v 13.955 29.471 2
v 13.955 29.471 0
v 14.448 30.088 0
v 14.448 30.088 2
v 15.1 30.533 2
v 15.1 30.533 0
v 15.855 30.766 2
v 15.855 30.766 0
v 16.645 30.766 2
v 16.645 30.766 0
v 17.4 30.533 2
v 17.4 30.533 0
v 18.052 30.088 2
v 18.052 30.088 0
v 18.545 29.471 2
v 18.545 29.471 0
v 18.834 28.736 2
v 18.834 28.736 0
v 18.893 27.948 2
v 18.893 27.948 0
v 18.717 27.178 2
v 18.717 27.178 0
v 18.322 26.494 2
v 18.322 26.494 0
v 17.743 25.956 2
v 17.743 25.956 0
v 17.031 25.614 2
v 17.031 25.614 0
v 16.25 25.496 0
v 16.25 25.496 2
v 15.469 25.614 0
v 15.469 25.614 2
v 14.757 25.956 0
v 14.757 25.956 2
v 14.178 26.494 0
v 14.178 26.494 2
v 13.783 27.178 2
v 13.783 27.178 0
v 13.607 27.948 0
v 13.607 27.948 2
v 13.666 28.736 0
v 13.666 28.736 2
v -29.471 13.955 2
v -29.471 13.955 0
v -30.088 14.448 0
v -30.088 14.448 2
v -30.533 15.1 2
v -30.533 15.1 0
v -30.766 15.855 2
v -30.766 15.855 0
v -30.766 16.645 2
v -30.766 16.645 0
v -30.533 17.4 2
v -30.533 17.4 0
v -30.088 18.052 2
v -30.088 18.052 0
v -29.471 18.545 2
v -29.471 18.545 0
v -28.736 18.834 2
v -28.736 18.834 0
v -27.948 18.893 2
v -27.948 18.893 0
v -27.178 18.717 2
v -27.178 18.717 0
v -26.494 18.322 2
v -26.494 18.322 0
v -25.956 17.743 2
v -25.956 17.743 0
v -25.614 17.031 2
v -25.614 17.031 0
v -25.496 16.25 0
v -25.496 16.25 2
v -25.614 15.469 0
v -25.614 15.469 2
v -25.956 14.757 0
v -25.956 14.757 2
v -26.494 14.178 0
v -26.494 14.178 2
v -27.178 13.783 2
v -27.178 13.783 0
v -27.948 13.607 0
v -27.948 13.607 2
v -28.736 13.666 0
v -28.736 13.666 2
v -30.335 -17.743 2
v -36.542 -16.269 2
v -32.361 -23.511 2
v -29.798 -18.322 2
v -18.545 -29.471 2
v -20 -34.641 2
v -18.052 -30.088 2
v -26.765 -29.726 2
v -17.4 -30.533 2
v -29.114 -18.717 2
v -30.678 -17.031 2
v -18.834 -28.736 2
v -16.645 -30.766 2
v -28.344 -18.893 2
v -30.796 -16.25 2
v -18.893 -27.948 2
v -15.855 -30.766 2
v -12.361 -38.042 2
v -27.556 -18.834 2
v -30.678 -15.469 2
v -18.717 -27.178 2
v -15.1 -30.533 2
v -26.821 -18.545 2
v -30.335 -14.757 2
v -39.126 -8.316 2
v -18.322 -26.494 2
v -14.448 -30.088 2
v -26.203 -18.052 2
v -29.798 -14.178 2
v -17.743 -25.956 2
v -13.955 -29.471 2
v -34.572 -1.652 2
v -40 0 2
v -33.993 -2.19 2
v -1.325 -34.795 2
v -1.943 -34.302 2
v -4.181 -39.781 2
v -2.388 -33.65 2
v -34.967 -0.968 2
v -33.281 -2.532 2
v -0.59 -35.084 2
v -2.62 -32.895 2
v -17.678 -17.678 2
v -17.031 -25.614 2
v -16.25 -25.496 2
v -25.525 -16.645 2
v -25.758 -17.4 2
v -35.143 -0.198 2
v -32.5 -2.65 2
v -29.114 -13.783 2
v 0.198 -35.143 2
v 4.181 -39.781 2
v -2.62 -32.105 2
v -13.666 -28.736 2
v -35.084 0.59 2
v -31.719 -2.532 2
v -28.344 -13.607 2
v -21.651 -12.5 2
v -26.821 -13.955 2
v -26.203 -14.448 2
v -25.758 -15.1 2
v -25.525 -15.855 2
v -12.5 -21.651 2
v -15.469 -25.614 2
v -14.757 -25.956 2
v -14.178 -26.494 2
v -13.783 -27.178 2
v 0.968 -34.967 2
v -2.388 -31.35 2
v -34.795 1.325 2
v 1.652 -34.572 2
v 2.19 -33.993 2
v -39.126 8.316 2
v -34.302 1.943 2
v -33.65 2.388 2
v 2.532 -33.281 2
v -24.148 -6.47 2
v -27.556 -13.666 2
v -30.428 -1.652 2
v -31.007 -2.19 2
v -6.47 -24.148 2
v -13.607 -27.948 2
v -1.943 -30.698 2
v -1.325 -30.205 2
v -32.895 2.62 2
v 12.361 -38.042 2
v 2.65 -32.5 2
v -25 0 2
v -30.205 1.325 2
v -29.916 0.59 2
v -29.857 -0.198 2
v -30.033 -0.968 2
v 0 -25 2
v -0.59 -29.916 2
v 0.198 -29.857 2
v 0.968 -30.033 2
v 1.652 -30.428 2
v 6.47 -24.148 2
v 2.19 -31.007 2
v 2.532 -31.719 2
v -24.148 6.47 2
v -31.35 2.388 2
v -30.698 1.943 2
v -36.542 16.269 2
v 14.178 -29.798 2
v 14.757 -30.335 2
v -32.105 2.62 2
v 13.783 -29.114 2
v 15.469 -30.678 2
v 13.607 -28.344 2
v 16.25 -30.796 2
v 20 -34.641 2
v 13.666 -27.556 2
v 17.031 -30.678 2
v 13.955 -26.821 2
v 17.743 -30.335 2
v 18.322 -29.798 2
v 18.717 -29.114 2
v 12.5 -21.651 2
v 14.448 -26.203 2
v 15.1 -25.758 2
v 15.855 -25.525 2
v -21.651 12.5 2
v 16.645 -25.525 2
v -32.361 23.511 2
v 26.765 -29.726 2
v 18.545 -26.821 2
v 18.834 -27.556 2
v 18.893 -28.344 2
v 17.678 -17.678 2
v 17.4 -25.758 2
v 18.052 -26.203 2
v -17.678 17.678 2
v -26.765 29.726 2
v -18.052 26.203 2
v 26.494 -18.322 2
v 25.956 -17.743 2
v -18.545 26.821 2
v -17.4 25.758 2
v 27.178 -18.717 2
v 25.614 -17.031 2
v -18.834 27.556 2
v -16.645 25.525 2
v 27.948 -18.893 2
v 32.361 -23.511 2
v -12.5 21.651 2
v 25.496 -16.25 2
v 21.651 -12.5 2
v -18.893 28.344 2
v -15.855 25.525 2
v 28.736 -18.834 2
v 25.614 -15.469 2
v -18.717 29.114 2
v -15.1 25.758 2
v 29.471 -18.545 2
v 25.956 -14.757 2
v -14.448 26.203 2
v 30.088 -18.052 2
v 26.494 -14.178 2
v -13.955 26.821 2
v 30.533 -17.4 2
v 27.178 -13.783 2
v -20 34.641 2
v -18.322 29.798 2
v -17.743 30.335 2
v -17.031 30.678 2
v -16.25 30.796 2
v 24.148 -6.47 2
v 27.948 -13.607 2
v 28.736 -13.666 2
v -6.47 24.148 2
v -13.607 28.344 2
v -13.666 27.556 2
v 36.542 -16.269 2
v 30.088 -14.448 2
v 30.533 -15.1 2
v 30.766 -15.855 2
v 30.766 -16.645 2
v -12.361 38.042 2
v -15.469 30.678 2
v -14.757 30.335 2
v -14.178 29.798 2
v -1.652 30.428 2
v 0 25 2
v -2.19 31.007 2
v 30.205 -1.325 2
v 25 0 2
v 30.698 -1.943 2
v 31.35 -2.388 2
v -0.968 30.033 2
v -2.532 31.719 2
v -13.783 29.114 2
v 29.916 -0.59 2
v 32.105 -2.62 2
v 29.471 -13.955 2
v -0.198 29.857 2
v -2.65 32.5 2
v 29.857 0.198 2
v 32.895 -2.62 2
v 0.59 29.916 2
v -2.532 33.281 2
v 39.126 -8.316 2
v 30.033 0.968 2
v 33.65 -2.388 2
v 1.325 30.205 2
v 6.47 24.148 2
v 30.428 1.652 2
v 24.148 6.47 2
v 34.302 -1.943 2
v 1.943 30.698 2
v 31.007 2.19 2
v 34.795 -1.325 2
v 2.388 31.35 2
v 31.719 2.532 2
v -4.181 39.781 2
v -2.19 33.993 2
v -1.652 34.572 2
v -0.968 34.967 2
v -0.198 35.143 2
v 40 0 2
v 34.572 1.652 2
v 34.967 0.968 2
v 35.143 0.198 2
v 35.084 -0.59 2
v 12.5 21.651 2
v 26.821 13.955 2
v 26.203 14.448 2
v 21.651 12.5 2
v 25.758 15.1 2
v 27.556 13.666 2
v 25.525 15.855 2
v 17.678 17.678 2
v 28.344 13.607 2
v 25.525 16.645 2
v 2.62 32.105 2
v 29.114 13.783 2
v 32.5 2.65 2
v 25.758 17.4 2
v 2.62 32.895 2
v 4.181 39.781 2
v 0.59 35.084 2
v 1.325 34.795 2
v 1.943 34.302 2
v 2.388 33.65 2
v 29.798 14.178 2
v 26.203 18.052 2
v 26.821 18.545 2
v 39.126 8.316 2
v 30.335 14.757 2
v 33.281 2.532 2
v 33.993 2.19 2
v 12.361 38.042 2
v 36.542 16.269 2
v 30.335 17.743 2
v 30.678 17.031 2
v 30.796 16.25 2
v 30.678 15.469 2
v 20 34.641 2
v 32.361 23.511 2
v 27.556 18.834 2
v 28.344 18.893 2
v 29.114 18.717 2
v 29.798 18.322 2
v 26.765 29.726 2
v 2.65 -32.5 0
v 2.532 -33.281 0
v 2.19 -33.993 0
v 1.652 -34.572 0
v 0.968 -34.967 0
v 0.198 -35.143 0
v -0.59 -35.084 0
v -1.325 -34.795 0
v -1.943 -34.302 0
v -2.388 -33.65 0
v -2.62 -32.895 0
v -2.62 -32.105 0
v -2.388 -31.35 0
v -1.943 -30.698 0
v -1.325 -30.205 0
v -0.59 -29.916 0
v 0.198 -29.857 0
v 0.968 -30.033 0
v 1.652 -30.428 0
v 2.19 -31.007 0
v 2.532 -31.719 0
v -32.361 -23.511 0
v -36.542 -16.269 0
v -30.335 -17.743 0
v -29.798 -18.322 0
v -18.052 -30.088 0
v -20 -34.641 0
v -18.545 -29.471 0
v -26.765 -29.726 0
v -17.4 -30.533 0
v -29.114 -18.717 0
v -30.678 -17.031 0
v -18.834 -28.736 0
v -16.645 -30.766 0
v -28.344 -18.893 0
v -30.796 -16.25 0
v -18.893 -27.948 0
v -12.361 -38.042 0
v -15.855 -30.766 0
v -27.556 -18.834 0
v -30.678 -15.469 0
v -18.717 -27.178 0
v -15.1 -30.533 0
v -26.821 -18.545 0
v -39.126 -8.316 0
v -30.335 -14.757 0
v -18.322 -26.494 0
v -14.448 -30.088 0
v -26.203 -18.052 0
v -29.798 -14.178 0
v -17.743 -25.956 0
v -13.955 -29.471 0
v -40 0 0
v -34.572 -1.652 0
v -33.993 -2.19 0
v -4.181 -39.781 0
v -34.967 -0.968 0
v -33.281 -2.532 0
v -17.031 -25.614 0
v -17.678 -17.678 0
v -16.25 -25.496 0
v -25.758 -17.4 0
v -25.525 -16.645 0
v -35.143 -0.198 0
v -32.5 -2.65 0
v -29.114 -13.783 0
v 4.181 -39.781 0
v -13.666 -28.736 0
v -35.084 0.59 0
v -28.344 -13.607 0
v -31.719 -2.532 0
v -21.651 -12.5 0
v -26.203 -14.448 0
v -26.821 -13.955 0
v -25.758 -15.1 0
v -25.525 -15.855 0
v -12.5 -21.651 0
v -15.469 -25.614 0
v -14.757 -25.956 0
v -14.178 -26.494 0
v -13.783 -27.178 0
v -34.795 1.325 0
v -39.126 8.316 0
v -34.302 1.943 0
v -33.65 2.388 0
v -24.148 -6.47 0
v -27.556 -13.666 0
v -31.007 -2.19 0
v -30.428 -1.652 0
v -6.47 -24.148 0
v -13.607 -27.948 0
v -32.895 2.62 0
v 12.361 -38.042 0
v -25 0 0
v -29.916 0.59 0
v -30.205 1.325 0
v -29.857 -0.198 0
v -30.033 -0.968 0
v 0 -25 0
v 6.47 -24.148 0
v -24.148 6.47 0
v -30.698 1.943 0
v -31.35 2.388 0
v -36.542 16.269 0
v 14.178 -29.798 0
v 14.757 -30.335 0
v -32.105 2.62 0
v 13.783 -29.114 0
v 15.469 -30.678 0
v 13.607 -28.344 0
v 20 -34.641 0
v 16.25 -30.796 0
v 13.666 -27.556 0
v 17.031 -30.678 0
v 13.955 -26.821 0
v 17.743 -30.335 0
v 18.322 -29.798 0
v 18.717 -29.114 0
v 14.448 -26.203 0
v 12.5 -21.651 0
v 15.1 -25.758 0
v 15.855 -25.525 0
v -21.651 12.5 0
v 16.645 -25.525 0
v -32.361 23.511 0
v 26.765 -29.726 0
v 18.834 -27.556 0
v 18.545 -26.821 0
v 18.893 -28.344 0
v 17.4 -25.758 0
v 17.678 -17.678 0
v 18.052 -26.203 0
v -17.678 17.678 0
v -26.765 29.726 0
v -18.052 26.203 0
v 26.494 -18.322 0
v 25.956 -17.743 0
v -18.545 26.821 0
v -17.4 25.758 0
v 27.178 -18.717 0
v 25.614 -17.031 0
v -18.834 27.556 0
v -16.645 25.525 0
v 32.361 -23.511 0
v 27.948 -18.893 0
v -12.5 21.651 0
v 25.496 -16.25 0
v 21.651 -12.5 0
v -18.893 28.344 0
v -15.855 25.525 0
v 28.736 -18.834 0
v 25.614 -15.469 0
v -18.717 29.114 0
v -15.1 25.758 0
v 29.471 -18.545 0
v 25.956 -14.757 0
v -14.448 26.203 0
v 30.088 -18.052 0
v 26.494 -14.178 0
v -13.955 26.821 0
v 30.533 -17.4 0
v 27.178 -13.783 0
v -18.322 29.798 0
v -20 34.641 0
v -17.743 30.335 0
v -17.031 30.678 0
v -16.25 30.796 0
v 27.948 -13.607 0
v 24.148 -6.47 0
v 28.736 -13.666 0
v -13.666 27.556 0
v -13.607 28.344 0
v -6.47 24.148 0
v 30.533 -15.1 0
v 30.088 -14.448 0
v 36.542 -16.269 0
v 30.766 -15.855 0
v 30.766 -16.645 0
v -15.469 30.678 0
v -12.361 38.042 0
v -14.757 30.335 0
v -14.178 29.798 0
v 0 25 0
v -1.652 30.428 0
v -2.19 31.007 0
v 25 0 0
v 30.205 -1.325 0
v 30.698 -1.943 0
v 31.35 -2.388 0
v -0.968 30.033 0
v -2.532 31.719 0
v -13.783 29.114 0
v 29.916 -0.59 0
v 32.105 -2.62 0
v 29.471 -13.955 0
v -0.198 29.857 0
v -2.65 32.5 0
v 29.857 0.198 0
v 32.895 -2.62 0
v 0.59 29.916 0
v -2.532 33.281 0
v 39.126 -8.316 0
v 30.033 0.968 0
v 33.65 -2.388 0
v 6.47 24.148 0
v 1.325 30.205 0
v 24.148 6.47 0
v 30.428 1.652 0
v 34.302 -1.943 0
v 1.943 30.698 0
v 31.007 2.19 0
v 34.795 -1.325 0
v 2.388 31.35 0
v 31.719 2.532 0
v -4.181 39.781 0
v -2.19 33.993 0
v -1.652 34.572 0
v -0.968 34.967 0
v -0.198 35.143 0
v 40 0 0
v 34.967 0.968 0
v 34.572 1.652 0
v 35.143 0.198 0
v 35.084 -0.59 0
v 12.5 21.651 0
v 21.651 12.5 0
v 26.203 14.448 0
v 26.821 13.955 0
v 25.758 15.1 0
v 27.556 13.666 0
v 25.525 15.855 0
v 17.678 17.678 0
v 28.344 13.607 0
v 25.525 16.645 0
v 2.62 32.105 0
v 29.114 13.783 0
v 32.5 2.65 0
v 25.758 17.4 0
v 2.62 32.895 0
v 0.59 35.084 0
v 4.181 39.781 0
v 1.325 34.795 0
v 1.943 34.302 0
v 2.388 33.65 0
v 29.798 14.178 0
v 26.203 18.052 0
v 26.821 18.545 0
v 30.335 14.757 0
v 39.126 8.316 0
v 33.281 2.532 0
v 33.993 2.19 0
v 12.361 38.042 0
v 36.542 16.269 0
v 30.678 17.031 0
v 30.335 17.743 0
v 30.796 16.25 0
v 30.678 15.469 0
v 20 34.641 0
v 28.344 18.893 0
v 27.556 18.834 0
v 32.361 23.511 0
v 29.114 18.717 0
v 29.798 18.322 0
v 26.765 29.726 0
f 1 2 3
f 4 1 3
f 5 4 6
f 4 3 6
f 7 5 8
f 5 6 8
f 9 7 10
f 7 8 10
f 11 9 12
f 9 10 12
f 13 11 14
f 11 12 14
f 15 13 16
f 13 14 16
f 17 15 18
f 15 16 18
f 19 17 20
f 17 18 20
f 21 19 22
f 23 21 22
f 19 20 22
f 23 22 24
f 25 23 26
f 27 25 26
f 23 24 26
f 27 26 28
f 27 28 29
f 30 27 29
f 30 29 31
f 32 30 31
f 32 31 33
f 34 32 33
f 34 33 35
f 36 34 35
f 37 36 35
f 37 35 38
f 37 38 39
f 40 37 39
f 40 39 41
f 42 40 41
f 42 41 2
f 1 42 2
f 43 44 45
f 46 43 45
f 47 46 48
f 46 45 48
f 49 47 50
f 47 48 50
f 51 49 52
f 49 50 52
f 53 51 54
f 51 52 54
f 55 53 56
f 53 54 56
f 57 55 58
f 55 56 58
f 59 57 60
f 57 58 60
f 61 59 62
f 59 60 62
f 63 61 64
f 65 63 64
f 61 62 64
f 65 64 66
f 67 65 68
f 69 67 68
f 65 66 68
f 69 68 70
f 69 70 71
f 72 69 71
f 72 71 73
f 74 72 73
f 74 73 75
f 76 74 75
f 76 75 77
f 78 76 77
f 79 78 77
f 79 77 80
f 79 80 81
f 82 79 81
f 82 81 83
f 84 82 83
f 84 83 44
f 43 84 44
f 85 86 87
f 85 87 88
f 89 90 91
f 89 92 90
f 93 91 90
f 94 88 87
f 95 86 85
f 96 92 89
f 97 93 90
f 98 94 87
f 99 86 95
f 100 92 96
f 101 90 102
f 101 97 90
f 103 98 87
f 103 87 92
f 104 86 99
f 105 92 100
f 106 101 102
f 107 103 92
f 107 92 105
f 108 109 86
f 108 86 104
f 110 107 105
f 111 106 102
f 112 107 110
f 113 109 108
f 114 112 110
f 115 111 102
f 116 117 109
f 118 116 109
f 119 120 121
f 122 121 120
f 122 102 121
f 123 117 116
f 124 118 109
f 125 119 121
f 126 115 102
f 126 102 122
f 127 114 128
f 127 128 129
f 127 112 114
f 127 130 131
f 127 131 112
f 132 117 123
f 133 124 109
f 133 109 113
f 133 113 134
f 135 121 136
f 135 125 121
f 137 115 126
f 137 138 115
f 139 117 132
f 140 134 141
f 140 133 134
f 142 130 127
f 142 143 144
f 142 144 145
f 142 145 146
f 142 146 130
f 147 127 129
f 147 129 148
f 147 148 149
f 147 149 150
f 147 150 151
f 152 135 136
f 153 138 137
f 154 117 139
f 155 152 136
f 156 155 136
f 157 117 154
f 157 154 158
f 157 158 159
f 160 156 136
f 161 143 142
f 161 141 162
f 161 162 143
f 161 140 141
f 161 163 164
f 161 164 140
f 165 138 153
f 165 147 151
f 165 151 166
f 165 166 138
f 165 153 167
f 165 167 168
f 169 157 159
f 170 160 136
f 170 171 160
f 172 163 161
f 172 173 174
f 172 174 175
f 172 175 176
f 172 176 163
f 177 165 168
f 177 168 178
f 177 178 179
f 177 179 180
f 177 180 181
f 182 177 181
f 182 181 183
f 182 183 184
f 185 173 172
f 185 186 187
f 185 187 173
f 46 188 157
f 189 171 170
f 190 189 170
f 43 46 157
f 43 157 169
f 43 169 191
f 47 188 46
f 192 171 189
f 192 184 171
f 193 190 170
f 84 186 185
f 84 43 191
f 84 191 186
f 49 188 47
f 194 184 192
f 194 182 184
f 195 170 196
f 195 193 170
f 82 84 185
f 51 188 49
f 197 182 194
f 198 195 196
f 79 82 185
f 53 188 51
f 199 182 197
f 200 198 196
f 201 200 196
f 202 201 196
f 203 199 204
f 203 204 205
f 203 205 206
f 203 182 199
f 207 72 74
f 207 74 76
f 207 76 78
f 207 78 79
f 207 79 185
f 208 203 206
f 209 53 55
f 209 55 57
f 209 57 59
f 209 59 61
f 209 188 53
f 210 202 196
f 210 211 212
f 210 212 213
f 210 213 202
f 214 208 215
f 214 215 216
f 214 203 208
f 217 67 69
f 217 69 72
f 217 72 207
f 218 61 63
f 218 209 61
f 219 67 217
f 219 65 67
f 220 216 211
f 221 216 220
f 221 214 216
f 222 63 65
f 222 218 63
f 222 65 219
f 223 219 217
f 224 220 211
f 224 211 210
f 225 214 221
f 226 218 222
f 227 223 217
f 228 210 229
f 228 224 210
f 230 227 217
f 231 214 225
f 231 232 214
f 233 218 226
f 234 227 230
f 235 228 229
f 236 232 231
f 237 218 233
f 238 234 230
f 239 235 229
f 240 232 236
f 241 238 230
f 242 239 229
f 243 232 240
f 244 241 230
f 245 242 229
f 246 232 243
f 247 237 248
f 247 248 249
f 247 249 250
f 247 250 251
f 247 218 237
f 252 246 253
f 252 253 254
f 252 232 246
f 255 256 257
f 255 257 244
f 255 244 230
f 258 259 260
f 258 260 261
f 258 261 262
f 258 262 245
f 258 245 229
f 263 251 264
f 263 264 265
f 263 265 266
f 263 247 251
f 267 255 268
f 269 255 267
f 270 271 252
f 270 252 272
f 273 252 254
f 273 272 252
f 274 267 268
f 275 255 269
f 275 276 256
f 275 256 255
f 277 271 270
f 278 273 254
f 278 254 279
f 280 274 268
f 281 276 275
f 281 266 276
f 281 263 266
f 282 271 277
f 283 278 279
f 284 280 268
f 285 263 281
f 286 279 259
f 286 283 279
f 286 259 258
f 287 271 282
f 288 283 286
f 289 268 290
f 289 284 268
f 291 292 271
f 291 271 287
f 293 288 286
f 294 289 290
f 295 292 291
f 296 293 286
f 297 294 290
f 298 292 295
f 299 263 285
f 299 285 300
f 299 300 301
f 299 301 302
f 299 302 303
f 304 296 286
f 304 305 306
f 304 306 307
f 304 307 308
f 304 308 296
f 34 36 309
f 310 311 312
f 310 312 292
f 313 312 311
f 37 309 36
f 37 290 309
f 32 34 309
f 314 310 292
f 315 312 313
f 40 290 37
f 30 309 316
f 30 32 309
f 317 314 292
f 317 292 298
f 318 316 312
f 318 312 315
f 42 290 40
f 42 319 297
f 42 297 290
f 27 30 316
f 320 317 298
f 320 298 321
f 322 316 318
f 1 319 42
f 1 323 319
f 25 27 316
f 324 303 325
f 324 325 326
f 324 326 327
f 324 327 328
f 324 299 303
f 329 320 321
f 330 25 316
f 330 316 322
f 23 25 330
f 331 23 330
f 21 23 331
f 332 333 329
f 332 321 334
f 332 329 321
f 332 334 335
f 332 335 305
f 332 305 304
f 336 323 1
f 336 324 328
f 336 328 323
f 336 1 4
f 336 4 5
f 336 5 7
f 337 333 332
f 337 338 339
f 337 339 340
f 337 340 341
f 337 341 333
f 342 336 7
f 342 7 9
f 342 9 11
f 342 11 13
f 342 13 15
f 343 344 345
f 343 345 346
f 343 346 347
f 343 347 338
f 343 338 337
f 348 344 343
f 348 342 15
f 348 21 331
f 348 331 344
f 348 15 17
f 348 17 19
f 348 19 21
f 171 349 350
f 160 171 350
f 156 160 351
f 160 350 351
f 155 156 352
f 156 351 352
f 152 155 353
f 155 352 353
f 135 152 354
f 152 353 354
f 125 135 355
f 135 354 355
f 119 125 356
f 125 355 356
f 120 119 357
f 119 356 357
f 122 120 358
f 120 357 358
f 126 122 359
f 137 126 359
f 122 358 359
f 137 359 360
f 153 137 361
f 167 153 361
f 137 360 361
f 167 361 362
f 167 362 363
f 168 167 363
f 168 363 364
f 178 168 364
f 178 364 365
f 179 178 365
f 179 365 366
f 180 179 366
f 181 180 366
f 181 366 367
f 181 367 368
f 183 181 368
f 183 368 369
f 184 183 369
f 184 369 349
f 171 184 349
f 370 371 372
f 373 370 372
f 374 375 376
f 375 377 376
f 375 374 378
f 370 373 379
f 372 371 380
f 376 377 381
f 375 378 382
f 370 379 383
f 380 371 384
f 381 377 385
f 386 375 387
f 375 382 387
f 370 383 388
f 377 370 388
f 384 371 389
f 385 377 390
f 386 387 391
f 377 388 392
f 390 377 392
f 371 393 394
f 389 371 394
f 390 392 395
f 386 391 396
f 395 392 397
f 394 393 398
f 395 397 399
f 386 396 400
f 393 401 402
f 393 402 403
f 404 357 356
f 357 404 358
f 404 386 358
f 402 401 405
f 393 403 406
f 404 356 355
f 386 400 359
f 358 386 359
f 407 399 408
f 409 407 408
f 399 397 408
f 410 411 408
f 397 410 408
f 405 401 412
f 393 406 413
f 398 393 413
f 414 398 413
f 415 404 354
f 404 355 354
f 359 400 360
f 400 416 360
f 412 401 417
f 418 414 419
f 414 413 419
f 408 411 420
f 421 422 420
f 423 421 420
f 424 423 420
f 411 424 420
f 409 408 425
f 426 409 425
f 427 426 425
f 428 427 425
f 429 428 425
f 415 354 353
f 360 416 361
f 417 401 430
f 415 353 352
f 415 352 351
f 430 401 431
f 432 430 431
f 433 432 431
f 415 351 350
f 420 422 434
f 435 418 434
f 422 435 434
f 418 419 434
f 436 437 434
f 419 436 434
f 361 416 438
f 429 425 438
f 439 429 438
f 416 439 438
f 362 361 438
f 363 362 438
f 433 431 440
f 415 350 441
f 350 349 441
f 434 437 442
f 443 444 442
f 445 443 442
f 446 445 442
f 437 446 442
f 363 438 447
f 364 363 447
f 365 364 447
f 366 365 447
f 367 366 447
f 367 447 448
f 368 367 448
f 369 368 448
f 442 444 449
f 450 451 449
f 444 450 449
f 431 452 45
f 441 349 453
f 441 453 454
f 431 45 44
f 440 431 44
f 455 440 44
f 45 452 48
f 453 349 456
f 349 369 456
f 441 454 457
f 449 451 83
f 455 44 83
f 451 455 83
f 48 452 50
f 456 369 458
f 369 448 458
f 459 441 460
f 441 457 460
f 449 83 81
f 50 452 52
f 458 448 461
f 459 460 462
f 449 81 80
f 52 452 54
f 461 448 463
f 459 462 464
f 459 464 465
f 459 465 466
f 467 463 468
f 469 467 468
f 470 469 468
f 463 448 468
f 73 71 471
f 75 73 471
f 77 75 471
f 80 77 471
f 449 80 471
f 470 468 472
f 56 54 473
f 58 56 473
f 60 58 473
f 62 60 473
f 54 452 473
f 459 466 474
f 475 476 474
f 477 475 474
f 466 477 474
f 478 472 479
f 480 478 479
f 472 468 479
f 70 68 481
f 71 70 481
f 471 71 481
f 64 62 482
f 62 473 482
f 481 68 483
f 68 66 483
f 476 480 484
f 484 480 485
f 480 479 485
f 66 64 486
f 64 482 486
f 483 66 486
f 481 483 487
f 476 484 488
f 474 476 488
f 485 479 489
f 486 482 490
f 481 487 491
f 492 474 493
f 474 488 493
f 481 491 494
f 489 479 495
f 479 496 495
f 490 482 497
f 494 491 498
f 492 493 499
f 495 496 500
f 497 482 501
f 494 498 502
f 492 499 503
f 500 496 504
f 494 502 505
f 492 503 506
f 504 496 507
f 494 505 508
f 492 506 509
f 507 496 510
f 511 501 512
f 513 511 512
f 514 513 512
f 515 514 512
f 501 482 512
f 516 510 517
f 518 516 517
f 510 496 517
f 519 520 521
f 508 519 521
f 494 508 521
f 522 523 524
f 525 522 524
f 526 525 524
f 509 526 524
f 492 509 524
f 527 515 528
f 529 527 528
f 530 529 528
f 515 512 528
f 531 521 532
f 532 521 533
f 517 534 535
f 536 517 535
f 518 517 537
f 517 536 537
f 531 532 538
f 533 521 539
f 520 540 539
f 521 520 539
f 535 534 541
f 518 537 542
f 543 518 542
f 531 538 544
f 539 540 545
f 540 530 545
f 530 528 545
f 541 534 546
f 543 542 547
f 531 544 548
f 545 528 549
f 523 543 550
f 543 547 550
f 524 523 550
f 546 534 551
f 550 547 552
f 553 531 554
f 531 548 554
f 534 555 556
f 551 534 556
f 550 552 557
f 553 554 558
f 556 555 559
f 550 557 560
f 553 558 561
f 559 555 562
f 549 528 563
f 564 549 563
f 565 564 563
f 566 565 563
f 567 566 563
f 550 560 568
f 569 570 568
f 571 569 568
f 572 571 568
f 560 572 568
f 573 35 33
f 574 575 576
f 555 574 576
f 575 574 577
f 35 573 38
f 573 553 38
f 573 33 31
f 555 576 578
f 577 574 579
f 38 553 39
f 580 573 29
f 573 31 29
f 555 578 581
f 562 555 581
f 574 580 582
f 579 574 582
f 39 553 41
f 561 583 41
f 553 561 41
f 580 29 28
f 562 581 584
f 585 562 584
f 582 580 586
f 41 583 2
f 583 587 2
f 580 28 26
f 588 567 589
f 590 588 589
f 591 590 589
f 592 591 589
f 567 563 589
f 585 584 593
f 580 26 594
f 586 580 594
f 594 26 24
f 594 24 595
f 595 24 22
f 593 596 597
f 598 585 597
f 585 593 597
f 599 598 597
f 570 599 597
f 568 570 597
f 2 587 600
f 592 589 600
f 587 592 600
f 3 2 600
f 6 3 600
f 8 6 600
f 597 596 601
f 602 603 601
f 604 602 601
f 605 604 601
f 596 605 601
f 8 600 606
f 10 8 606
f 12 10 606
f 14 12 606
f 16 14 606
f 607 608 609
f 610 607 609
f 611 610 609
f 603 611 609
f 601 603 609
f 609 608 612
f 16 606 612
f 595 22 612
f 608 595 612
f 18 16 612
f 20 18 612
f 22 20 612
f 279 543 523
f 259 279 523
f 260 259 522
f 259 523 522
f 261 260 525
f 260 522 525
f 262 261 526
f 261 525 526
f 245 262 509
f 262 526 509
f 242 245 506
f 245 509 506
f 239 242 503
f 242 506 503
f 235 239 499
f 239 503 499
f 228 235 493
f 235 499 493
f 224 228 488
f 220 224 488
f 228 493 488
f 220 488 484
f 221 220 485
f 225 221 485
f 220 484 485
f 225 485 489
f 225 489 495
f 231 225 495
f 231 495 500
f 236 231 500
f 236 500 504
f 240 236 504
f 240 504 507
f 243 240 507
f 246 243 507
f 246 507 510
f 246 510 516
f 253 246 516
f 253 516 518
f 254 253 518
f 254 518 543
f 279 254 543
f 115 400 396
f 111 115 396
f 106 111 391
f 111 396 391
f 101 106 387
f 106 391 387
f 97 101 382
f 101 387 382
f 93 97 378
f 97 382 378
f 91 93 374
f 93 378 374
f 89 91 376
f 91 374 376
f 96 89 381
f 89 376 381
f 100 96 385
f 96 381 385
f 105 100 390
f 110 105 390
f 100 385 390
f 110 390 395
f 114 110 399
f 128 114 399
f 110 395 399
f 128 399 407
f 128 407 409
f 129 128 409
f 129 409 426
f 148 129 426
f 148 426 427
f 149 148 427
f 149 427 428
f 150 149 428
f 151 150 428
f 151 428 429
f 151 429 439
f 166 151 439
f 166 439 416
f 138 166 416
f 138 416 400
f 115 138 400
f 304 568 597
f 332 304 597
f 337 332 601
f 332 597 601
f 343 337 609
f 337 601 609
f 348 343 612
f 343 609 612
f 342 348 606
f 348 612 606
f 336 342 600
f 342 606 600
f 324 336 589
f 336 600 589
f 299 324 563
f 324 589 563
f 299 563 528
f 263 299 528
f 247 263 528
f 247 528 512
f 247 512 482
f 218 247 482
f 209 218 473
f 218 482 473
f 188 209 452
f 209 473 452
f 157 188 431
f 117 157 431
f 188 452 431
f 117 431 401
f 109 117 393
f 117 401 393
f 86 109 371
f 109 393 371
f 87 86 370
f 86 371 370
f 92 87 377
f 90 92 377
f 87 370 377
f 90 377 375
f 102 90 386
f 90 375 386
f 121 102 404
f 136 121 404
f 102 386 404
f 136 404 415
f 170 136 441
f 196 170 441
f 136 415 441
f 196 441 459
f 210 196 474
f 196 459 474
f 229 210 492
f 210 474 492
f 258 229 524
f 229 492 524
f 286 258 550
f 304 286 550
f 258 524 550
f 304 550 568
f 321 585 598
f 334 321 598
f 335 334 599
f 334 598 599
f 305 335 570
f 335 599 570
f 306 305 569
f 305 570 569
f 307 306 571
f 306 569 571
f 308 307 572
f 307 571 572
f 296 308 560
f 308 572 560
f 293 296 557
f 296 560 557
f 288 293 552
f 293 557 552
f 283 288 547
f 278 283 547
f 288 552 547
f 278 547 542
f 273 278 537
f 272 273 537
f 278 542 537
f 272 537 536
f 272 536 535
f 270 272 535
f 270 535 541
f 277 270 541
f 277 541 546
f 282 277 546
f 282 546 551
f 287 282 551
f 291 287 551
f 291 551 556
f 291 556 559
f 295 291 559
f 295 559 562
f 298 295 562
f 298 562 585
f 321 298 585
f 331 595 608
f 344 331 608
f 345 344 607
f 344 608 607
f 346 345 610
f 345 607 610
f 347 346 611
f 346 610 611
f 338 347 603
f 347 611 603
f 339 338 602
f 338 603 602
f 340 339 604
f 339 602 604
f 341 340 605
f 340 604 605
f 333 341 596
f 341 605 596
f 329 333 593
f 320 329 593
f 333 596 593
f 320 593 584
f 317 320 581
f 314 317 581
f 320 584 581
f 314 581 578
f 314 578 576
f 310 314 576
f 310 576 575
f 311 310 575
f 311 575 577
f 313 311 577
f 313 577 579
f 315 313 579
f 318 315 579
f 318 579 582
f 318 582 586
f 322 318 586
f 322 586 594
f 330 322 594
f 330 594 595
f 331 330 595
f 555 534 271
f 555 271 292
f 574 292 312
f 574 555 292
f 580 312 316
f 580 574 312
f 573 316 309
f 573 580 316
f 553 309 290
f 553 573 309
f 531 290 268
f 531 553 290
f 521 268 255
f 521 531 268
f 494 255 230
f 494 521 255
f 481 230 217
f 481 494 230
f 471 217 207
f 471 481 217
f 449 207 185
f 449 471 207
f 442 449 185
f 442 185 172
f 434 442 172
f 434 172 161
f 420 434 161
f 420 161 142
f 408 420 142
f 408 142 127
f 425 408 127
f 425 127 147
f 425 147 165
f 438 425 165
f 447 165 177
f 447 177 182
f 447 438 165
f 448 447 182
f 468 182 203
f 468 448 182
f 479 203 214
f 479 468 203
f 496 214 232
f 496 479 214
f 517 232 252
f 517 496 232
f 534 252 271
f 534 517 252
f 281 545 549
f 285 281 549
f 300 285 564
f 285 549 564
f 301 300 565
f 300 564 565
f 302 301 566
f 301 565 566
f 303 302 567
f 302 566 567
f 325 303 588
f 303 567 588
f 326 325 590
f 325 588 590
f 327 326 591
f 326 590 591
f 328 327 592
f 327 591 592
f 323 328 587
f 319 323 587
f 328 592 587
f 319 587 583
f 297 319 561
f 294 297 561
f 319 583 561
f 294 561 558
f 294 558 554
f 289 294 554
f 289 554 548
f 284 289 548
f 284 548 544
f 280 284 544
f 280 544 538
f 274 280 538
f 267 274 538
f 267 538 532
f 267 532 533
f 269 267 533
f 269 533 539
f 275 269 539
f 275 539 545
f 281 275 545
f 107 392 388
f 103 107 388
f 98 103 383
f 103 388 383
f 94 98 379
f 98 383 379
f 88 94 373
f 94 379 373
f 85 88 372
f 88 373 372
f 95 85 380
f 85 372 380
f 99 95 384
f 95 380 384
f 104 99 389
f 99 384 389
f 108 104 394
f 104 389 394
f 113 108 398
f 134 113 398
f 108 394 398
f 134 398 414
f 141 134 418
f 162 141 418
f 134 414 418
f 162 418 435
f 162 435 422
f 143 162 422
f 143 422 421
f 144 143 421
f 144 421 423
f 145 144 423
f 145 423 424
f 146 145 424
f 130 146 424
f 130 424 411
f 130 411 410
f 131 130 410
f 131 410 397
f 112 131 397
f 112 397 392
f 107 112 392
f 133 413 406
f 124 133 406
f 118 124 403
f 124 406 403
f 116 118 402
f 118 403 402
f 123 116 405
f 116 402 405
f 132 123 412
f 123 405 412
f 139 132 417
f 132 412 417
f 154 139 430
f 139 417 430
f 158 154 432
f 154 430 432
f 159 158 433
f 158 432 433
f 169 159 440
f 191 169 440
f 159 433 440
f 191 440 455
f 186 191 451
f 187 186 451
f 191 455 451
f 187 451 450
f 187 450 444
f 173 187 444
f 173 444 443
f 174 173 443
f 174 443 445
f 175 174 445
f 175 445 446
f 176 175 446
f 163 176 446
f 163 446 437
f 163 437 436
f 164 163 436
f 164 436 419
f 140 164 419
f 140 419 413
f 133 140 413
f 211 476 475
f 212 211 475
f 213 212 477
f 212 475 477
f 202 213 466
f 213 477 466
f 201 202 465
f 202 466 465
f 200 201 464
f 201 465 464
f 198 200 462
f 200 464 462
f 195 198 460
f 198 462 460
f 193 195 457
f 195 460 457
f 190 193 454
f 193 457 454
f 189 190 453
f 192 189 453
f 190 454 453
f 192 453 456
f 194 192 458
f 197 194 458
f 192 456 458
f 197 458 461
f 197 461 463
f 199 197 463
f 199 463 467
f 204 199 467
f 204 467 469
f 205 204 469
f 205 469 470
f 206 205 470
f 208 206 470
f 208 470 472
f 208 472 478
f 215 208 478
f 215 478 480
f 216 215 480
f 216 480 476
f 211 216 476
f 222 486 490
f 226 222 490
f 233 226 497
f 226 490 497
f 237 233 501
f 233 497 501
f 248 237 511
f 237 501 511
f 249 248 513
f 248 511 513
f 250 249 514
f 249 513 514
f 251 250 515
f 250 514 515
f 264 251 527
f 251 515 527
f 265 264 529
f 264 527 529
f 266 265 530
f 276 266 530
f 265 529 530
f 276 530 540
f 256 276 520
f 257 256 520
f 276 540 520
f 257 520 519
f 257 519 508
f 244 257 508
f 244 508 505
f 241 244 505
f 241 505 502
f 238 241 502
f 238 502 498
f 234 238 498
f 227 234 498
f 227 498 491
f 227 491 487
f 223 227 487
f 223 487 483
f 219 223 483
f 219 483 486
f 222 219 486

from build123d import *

# Parameters (mm, degrees)
SKETCH1_R            = 40
SKETCH1_R_2          = 25
BOSS_EXTRUDE1_DEPTH  = 2
M5_CLEARANCE_HOLE1_D = 5.3
CIRPATTERN1_COUNT    = 12


with BuildPart() as part:
    # Sketch1 → Boss-Extrude1 (new body)
    with BuildSketch(Plane.XY):
        Circle(SKETCH1_R)
        Circle(SKETCH1_R_2, mode=Mode.SUBTRACT)
    extrude(amount=BOSS_EXTRUDE1_DEPTH)

    # M5 Clearance Hole1 (through all)
    with Locations(Plane.XY.offset(2)):
        with Locations((0, 32.5)):
            m5_clearance_hole1 = Hole(M5_CLEARANCE_HOLE1_D / 2)

    # CirPattern1: M5 Clearance Hole1 ×12 about axis
    cirpattern1_axis = Axis((0, 0, 0), (0, 0, 1))
    for i in range(1, CIRPATTERN1_COUNT):
        add(m5_clearance_hole1.rotate(cirpattern1_axis, i * 360 / CIRPATTERN1_COUNT), mode=Mode.SUBTRACT)


solid = part.part
